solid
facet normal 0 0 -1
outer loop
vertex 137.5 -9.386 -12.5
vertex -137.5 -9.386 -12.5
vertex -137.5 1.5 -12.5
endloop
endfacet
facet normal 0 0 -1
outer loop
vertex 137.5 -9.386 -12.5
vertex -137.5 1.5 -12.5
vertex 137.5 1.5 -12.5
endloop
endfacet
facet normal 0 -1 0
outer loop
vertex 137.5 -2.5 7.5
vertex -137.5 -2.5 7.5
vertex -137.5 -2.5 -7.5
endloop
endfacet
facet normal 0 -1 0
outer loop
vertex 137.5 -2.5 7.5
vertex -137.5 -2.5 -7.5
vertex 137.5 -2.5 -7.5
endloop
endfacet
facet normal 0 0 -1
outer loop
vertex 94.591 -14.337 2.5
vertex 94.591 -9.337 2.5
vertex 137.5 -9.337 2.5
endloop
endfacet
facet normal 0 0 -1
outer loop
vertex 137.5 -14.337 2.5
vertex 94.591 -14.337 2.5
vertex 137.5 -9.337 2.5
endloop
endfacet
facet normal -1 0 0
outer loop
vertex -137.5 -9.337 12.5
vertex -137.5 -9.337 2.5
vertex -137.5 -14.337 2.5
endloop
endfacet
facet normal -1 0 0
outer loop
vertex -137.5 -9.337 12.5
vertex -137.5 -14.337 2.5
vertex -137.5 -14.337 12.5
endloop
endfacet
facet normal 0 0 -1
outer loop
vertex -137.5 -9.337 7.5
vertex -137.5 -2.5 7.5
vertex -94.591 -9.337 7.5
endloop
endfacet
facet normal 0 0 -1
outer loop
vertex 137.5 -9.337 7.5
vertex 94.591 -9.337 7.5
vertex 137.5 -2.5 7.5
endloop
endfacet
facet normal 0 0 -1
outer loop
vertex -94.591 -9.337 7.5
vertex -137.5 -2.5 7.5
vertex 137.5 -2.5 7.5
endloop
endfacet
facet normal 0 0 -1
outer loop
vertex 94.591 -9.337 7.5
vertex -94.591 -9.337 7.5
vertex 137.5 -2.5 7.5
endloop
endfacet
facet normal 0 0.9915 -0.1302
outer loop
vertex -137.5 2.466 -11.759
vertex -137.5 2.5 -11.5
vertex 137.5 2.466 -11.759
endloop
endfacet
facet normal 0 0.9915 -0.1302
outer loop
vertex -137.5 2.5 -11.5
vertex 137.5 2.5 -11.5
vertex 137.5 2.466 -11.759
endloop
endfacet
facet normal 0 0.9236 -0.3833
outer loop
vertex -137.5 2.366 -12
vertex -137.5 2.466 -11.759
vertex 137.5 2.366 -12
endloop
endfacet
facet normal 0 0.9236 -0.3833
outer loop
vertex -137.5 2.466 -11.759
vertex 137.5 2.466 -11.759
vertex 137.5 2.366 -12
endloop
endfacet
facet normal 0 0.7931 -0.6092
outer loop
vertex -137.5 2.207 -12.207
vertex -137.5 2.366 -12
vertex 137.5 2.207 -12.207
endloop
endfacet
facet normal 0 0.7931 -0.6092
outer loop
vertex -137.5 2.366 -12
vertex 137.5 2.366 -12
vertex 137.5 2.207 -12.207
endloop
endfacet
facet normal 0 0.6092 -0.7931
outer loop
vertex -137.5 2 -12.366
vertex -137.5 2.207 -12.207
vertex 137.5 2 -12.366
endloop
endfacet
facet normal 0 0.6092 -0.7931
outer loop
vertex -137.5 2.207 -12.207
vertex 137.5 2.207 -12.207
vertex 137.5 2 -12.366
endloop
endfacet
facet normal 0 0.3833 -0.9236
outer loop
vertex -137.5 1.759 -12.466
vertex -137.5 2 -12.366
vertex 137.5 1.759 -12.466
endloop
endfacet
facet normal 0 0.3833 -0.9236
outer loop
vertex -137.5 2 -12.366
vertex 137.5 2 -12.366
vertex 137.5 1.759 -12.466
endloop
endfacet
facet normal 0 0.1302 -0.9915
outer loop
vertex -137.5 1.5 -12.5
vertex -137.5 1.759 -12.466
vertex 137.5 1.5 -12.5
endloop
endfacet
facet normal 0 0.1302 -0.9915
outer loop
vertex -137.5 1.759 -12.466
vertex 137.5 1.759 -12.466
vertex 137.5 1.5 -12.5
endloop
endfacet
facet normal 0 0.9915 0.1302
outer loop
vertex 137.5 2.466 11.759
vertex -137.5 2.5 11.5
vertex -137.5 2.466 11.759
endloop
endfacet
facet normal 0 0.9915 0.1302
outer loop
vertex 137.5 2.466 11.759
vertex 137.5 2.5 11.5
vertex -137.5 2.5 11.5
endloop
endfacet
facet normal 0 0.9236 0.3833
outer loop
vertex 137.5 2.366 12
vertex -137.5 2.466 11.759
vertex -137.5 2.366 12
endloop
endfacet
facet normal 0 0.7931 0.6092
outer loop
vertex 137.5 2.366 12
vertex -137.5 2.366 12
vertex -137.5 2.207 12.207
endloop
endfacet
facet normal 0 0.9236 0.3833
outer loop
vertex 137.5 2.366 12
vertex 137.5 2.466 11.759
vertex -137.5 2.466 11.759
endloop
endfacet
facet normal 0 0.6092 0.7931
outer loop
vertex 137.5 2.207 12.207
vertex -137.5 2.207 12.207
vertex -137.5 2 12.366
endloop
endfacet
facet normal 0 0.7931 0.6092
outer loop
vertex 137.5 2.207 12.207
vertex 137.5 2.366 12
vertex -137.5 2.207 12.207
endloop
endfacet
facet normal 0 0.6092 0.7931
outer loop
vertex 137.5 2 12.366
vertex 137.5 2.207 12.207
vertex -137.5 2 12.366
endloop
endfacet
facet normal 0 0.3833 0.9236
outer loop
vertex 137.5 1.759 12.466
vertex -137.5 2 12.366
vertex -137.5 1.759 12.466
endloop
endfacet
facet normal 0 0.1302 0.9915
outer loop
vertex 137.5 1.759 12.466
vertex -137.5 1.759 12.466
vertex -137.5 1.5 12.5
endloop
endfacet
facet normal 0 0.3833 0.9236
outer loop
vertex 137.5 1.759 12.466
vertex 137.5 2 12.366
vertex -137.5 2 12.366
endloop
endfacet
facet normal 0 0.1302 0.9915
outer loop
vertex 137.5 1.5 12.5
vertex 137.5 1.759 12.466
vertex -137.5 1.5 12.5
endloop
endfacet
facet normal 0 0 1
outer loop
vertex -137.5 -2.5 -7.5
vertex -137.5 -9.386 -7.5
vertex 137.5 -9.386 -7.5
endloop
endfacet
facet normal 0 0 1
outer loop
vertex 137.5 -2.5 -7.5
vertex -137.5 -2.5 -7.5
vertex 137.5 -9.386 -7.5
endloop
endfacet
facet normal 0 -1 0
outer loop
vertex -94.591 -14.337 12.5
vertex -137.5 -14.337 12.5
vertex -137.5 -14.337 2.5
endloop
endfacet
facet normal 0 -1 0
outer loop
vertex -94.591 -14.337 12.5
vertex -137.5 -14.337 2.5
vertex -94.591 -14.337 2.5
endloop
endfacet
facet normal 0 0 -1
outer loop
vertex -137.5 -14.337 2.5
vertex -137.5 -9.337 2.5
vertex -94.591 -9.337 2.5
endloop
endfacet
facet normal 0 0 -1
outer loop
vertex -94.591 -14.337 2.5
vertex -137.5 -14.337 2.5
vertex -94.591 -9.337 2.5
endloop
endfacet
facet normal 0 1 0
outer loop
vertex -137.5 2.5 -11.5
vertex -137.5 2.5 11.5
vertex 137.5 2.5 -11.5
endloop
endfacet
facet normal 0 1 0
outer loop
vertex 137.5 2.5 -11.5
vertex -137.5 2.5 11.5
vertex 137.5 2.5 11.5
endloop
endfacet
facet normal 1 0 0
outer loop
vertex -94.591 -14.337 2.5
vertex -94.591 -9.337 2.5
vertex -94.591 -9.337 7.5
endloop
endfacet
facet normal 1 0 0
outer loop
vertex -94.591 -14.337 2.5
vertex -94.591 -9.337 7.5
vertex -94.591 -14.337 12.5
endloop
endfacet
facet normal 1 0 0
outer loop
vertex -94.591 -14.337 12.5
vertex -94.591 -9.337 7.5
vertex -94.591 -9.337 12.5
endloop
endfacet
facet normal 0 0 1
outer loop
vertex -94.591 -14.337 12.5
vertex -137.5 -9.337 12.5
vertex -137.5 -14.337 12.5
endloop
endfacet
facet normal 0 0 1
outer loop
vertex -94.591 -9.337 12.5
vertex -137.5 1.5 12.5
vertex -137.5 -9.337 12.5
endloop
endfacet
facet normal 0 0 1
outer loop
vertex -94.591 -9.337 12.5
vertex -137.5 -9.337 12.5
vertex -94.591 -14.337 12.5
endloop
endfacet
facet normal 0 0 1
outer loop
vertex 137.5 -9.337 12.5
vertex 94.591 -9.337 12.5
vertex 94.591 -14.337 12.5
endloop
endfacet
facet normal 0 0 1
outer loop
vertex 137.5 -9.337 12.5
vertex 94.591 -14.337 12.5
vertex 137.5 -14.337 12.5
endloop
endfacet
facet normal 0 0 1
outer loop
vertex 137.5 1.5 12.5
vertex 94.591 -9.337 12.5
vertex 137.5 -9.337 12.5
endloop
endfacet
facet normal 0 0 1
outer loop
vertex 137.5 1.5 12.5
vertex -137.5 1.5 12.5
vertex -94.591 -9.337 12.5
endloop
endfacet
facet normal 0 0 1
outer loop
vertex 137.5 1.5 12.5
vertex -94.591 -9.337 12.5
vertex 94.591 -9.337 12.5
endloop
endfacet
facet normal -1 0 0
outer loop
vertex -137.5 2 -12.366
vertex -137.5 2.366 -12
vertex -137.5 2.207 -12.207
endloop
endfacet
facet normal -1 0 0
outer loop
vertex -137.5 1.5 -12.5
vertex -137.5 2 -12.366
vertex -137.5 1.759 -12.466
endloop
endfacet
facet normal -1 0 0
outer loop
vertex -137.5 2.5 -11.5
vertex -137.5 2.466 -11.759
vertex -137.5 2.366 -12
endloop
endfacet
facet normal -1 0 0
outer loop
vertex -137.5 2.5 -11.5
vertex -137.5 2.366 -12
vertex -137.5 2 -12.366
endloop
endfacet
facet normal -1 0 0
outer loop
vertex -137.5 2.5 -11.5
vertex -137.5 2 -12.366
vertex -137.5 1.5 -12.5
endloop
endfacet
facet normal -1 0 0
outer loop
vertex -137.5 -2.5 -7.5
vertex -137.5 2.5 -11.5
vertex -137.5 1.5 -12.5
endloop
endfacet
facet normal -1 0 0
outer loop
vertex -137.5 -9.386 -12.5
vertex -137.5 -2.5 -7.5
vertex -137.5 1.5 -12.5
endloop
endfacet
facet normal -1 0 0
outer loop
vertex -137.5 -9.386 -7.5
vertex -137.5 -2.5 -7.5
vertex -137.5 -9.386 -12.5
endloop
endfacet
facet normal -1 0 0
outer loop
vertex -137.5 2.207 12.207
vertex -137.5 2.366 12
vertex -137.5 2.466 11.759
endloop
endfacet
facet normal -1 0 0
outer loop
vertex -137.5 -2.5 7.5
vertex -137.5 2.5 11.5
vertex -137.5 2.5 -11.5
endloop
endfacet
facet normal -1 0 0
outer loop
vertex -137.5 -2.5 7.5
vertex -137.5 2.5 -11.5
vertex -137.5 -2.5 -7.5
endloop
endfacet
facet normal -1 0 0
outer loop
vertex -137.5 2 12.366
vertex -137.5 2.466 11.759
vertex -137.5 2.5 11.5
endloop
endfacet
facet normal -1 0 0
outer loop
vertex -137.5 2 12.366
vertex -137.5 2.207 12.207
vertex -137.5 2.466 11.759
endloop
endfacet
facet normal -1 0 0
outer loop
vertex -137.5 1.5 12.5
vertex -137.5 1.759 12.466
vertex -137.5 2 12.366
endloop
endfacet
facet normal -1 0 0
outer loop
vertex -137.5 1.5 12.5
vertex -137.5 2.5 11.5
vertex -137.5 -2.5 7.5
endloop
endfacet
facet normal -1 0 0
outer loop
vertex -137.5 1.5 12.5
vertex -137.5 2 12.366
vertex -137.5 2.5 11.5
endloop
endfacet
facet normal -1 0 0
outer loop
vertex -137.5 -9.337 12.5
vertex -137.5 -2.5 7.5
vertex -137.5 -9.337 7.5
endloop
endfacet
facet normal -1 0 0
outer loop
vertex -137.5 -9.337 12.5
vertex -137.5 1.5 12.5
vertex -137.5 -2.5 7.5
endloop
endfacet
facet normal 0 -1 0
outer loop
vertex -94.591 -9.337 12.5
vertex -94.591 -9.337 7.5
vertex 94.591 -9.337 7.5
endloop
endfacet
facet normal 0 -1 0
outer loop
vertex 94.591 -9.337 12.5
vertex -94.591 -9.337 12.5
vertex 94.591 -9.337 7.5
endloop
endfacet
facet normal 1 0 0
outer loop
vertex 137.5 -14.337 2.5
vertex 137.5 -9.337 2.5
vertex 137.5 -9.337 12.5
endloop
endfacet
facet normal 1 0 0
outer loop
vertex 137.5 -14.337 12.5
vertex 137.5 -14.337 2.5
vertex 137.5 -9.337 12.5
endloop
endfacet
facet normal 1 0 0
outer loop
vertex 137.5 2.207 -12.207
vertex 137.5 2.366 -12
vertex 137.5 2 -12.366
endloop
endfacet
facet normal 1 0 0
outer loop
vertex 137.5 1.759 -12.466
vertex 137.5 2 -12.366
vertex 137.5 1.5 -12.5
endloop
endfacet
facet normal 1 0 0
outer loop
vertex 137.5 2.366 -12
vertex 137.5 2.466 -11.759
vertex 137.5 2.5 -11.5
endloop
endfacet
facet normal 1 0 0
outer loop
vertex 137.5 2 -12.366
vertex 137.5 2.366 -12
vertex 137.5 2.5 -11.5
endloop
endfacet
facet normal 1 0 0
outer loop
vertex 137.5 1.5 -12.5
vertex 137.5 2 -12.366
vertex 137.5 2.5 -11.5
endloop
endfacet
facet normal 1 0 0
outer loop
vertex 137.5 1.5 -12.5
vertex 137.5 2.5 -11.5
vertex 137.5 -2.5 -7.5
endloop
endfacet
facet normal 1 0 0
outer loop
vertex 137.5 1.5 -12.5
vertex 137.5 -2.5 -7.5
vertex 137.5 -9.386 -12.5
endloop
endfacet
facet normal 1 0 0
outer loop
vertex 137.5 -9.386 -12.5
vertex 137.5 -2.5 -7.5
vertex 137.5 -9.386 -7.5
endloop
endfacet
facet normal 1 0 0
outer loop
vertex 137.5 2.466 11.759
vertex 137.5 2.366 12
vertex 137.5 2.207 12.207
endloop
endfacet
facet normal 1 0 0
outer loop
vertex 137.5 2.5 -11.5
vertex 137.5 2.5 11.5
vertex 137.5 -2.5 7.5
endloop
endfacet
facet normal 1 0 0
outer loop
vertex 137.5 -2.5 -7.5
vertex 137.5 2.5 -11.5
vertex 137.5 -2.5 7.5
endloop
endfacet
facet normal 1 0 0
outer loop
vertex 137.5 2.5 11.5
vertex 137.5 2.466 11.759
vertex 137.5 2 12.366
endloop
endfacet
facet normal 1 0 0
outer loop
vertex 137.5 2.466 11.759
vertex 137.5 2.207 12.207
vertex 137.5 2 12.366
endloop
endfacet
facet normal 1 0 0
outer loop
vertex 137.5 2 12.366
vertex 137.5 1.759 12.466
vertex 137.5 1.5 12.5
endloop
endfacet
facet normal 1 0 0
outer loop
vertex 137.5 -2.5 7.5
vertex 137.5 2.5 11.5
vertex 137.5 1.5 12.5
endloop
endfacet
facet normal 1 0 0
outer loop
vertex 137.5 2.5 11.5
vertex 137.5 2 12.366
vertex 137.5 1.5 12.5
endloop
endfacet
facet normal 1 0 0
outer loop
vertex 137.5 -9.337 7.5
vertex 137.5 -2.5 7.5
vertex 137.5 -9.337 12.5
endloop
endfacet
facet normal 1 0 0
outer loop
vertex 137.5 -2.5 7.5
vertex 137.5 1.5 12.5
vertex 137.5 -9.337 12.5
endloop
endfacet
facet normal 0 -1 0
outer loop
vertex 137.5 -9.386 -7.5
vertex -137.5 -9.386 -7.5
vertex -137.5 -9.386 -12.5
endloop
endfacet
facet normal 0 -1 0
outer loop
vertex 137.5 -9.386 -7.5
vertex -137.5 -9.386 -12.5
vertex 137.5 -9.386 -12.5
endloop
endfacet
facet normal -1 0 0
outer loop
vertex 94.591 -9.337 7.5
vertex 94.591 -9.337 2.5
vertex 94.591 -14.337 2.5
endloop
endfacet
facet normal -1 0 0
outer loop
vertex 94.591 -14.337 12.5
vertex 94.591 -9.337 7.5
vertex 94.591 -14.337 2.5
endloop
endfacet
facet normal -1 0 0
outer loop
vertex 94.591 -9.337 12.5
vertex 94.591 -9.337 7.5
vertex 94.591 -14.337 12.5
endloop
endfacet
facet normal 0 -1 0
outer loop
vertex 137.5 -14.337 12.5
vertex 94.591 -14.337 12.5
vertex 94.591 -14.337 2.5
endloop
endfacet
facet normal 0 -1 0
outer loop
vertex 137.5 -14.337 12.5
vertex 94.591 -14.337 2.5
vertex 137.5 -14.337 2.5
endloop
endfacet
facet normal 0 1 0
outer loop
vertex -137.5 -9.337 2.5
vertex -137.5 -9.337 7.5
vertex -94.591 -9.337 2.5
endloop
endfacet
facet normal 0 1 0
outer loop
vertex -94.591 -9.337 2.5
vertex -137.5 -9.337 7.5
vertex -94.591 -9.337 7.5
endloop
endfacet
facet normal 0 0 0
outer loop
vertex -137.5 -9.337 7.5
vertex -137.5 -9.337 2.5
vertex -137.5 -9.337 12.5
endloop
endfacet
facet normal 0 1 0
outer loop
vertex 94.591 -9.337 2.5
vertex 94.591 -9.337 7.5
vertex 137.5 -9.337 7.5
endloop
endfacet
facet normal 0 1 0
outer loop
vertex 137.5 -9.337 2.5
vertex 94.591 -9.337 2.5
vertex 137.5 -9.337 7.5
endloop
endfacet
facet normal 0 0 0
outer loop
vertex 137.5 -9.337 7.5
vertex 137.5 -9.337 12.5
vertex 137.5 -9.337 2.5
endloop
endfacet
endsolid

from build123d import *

# Parameters (mm, degrees)
F0_W     = 275
F0_H     = 5
F1_DEPTH = 7.5
F2_W     = 275
F2_H     = 11.837108
F3_DEPTH = 5
F4_W     = 42.909291
F4_H     = 10
F5_DEPTH = 5
F6_W     = 275
F6_H     = 11.88611
F7_DEPTH = 5
F8_R     = 1


with BuildPart() as f1:
    # F0 (on Top) → F1 (new body, symmetric)
    with BuildSketch(Plane.XY):
        Rectangle(F0_W, F0_H)
    extrude(amount=F1_DEPTH, both=True)

    # F2 (on face) → F3 (join)
    with BuildSketch(Plane.XY.offset(7.5)):
        with Locations((0, -3.418554)):
            Rectangle(F2_W, F2_H)
    extrude(amount=F3_DEPTH)

    # F4 (on face) → F5 (join)
    with BuildSketch(Plane.XZ.offset(9.337108)):
        with Locations((-116.045355, 7.5)):
            Rectangle(F4_W, F4_H)
        with Locations((116.045355, 7.5)):
            Rectangle(F4_W, F4_H)
    extrude(amount=F5_DEPTH)

    # F6 (on face) → F7 (join)
    with BuildSketch(Plane(origin=(0, 0, -7.5), x_dir=(1, 0, 0), z_dir=(0, 0, -1))):
        with Locations((0, 3.443055)):
            Rectangle(F6_W, F6_H)
    extrude(amount=F7_DEPTH)

    # F8
    f8_edges = [f1.edges().sort_by_distance(p)[0] for p in [
        (0, 2.5, 12.5),
        (0, 2.5, -12.5),
    ]]
    fillet(f8_edges, radius=F8_R)


solid = f1.part
